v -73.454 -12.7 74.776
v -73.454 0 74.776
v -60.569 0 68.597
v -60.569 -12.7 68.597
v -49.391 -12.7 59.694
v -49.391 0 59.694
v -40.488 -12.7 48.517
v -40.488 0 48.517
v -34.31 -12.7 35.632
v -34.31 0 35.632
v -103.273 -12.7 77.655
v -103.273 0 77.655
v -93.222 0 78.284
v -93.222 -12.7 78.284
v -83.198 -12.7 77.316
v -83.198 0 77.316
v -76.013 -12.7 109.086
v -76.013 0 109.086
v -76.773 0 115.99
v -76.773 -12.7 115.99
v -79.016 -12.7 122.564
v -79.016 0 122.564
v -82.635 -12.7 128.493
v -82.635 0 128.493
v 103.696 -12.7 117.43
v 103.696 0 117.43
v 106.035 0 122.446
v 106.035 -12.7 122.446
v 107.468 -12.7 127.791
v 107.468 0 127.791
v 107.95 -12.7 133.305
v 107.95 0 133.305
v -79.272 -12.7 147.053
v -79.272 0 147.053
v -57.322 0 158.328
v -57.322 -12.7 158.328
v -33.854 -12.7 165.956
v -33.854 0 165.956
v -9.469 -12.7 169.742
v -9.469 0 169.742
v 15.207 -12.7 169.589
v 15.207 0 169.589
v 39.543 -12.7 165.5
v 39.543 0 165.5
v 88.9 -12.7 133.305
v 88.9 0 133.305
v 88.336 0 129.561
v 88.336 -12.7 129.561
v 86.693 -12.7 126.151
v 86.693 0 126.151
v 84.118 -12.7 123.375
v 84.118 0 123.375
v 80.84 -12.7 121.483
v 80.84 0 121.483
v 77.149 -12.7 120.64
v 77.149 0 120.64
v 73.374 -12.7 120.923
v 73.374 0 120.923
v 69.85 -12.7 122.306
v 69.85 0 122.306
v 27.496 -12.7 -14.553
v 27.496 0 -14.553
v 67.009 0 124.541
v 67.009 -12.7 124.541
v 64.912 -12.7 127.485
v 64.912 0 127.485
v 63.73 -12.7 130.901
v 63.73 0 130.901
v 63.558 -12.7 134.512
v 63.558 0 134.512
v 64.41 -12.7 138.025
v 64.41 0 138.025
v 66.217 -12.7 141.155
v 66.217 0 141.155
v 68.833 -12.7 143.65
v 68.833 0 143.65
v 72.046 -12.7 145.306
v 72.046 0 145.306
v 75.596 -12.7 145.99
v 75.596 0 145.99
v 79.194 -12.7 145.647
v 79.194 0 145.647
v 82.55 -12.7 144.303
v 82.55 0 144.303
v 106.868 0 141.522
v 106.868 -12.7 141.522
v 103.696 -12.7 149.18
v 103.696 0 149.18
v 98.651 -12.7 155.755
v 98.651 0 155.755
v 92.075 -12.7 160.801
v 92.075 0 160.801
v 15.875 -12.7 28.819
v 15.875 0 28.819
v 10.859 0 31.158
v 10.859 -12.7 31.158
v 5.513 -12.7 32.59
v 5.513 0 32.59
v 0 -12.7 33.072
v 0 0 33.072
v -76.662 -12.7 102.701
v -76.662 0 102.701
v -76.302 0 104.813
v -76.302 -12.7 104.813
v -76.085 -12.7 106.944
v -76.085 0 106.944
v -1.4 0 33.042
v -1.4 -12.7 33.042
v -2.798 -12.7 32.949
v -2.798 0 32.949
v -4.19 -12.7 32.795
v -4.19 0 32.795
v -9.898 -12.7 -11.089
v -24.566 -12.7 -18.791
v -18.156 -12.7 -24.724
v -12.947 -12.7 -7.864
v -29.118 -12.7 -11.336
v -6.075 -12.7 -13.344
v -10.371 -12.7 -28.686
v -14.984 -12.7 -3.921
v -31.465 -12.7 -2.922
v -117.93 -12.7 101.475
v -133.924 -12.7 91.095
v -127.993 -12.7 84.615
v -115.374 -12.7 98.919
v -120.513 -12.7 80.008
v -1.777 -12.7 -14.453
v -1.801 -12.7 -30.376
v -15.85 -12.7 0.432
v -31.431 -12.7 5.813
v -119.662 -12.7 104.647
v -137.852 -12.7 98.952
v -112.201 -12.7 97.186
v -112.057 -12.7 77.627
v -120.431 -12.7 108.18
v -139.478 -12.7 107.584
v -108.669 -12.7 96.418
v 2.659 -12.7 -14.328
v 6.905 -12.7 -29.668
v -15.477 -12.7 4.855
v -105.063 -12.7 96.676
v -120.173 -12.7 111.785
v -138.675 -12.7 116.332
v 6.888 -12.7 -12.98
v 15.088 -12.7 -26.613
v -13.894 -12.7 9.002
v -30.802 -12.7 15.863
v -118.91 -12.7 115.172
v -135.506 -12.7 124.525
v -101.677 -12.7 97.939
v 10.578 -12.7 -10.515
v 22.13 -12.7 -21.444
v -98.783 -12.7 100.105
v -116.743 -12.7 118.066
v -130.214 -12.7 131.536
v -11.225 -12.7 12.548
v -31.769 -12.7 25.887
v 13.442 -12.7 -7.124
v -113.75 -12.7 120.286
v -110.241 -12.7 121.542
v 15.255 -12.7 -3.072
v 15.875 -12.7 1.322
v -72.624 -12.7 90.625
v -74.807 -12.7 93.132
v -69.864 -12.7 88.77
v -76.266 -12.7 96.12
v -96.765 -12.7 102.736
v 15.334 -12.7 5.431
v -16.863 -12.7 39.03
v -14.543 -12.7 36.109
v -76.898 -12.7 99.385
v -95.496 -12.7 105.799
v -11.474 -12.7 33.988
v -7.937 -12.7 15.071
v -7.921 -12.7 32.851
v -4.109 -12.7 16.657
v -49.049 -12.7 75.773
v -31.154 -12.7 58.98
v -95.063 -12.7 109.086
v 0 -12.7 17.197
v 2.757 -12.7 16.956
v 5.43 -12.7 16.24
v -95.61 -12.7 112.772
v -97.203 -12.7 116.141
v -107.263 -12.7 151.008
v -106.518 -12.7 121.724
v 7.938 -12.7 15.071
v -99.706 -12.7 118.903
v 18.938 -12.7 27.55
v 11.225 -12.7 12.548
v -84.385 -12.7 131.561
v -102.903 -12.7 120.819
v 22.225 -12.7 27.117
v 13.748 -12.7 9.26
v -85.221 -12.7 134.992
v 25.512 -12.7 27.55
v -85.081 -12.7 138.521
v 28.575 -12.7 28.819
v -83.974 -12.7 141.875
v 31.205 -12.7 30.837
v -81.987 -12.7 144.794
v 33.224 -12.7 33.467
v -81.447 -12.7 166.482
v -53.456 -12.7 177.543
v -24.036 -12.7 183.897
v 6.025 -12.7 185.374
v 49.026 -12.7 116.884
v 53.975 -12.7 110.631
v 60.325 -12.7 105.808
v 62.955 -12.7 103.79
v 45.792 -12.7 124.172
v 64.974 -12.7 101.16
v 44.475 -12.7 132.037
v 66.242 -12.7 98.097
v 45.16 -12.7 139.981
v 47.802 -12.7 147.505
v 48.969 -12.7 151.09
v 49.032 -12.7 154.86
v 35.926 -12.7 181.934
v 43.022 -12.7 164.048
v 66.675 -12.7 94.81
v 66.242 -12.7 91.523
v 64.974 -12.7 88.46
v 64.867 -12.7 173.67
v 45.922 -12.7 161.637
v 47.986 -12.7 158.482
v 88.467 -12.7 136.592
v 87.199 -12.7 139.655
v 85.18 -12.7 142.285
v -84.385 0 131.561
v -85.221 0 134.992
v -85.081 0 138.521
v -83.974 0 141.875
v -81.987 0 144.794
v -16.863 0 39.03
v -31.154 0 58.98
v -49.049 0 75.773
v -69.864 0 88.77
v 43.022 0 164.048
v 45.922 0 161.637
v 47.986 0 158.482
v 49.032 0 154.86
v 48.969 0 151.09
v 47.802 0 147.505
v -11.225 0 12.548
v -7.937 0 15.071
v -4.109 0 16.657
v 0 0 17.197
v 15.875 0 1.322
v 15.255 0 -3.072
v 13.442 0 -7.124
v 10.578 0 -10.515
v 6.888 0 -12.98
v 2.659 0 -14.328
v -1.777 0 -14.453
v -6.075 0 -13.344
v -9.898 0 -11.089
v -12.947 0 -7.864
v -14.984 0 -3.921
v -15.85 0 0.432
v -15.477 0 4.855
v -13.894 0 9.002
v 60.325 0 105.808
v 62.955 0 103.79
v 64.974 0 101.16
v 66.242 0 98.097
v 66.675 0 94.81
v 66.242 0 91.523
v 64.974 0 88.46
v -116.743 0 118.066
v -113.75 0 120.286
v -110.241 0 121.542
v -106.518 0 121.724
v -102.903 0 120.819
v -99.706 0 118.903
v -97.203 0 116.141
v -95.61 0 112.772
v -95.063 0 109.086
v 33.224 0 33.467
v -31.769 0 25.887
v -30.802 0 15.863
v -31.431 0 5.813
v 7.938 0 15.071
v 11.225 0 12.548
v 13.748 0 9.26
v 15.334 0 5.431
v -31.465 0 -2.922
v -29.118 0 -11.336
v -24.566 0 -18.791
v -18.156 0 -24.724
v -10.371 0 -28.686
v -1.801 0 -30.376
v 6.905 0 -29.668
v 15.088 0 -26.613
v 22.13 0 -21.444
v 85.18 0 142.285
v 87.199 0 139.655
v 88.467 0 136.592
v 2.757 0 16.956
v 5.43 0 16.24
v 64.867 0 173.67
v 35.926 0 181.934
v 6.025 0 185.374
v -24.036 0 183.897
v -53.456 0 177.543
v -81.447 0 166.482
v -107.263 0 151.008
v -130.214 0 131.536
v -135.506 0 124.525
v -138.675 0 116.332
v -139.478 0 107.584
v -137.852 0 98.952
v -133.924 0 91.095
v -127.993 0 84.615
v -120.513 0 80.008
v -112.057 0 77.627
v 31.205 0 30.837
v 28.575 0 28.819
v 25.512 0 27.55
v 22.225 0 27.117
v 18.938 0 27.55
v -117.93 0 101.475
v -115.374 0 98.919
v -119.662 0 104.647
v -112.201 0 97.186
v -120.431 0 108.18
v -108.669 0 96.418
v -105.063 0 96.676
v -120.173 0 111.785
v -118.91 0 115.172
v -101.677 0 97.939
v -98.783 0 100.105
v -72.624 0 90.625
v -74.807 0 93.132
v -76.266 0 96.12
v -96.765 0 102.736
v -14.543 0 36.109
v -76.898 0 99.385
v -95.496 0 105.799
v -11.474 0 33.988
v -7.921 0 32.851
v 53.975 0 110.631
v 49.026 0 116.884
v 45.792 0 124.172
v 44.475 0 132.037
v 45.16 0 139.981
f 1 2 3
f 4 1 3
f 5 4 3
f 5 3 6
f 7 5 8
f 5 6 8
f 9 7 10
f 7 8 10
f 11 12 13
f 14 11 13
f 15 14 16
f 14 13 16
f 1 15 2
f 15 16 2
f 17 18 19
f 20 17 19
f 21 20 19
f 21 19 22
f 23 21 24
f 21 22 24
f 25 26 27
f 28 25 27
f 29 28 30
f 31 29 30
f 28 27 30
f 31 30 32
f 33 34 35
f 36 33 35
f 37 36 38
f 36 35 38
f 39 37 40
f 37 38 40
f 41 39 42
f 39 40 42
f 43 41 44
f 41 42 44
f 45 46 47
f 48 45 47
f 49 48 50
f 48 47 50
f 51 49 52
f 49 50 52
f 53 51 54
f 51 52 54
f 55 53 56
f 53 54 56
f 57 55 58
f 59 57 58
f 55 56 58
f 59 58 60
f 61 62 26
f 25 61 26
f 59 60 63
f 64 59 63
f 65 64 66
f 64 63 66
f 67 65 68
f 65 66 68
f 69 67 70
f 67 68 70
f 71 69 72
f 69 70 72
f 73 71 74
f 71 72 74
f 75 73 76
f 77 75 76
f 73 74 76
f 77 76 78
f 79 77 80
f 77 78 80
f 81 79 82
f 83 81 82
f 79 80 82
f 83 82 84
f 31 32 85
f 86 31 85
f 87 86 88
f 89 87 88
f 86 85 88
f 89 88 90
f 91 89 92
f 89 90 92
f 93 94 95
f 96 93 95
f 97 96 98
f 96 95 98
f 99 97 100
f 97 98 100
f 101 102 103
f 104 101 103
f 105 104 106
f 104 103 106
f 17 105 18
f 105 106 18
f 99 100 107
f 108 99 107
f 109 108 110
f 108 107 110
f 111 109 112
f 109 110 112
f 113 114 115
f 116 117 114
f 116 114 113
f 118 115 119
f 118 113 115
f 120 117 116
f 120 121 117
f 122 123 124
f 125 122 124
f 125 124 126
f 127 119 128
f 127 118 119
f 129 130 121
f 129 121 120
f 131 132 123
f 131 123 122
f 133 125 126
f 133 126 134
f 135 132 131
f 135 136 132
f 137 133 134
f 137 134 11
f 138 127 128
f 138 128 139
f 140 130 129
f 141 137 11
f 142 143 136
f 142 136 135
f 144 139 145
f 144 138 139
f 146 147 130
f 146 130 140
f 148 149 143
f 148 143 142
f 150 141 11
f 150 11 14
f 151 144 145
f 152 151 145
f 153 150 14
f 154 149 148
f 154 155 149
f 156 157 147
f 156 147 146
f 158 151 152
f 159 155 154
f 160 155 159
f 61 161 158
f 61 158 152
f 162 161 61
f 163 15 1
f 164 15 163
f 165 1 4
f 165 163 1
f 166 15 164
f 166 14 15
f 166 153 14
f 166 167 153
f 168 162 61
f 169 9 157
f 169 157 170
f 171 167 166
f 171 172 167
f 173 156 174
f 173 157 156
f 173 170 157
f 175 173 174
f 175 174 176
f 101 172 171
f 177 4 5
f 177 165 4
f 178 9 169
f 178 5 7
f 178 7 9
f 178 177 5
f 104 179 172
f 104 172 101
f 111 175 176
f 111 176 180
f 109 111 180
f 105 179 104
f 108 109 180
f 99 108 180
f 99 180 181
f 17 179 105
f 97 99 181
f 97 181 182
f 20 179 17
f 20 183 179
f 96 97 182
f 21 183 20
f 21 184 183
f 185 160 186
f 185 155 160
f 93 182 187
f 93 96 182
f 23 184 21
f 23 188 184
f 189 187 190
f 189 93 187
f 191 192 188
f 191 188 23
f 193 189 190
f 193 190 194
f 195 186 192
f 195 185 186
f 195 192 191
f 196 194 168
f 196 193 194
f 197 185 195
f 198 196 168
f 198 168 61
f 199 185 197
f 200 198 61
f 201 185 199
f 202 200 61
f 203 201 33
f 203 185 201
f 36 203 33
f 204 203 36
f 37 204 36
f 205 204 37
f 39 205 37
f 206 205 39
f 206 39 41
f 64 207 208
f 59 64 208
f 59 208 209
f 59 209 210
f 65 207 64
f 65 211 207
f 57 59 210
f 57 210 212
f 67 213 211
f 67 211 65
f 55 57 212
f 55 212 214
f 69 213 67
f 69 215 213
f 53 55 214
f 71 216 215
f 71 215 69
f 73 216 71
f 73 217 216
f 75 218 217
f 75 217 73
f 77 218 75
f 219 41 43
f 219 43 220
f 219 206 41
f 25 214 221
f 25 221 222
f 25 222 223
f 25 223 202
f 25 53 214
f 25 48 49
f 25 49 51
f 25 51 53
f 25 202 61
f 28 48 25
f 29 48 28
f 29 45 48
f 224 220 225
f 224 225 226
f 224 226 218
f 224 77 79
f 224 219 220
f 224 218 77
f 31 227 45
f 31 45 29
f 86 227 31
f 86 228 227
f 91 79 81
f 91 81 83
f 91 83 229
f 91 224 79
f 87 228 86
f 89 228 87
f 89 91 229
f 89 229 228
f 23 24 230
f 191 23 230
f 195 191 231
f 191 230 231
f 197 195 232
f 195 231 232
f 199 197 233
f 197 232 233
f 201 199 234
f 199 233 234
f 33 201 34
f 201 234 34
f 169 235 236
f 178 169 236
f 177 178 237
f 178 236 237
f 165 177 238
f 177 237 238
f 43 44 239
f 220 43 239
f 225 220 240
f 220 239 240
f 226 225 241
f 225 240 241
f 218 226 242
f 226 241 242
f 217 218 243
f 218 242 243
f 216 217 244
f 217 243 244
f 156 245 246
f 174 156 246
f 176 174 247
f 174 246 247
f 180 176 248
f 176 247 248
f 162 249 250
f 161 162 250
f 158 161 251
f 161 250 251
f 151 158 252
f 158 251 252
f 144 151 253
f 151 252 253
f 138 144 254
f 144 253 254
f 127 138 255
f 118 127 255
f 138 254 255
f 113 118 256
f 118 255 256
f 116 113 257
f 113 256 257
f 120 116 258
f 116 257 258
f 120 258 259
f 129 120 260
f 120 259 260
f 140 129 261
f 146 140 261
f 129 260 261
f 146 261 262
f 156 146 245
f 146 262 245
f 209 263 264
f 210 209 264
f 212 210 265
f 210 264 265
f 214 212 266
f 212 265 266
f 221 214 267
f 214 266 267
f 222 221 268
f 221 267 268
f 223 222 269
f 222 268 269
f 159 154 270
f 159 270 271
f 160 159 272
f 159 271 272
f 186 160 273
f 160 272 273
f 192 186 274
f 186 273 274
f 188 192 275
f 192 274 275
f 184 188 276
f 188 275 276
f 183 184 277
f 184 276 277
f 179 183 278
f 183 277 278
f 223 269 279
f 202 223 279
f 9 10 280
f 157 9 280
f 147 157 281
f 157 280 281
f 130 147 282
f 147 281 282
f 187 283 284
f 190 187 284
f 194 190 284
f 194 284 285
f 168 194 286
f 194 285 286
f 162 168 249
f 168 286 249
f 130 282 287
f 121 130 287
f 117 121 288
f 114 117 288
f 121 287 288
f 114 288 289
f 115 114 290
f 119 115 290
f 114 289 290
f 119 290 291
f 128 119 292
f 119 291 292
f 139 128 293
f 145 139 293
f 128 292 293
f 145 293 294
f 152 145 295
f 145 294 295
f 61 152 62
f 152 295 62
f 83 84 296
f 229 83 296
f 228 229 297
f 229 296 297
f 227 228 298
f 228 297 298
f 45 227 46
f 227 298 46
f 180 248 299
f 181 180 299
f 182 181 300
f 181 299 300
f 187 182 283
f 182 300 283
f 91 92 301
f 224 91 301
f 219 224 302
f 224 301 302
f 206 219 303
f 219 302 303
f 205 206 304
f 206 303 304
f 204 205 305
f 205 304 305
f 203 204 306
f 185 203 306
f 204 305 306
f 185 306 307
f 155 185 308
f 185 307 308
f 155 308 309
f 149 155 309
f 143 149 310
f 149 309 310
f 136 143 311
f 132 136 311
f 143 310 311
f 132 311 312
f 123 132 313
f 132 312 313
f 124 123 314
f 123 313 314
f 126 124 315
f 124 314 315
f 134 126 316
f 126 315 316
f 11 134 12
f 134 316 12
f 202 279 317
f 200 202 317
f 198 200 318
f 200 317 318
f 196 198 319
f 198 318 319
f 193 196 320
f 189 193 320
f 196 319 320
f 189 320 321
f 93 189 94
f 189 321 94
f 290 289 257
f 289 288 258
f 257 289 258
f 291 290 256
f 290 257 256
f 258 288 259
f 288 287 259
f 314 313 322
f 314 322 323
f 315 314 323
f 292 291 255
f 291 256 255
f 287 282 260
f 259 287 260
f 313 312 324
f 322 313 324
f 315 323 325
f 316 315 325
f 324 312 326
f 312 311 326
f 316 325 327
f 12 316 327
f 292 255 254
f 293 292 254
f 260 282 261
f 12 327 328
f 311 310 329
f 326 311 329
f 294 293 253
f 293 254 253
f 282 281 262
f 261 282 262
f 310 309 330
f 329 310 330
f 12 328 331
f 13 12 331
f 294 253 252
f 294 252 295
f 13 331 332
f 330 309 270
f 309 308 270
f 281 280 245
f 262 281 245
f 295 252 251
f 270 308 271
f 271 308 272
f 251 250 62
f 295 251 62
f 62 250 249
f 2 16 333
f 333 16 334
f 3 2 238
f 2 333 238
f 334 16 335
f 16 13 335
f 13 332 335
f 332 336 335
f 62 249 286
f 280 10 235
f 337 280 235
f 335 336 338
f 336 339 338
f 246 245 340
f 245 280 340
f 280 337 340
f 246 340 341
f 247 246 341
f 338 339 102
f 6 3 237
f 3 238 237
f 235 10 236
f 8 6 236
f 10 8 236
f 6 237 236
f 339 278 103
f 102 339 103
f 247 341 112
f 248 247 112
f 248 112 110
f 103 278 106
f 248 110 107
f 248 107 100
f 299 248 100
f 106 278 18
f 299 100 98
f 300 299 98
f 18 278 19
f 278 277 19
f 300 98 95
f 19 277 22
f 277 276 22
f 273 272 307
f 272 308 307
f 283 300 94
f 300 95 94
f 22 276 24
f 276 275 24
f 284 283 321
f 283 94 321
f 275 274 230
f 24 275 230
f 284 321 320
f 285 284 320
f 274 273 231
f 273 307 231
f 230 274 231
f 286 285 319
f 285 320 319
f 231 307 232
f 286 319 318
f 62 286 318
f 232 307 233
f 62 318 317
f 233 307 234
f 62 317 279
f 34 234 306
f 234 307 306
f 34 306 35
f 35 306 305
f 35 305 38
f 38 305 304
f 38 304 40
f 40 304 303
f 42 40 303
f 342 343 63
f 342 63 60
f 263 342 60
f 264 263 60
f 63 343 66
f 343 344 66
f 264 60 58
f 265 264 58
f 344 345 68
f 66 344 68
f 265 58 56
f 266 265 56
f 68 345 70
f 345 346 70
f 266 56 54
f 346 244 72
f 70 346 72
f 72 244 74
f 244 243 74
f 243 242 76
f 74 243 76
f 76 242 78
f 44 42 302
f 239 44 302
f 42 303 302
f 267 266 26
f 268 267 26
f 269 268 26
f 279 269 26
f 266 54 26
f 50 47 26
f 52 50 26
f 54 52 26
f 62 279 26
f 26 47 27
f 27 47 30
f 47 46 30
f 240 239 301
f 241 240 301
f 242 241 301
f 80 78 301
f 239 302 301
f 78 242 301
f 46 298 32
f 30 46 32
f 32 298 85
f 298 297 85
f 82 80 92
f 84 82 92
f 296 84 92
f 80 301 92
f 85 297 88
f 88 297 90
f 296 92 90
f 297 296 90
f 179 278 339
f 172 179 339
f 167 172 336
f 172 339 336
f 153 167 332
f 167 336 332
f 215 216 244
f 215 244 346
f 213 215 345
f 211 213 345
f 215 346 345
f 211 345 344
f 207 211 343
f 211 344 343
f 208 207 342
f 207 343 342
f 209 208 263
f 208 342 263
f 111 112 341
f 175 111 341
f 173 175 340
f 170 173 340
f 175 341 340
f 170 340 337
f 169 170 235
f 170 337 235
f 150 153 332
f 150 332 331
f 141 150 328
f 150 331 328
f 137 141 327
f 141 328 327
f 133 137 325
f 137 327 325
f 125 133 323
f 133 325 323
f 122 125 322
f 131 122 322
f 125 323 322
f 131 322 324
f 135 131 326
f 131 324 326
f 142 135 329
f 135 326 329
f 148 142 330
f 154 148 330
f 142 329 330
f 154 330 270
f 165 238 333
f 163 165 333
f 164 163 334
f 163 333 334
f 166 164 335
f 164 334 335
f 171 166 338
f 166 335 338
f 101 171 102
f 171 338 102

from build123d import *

# Parameters (mm, degrees)
F1_DEPTH = 12.7


with BuildPart() as f1:
    # F0 (on Front) → F1 (new body)
    with BuildSketch(Plane.XZ):
        with BuildLine():
            ThreePointArc((-76.6615778684, 102.701242205), (-79.8079393943, 94.0332154271), (-85.3124331502, 86.6349164629))
            Line((-85.3124331502, 86.6349164629), (-73.4535511858, 74.7760344986))
            ThreePointArc((-73.4535511858, 74.7760344986), (-49.3914086659, 59.6941480997), (-34.309522267, 35.6320055797))
            Line((-34.309522267, 35.6320055797), (-22.4506403027, 23.7731236154))
            ThreePointArc((-22.4506403027, 23.7731236154), (-14.0635457715, 29.7878865302), (-4.1903736131, 32.7947452108))
            ThreePointArc((-4.1903736131, 32.7947452108), (-11.4735568319, 33.9884241162), (-16.8631754222, 39.0304116786))
            ThreePointArc((-16.8631754222, 39.0304116786), (-39.690876035, 67.8137699888), (-69.8640218822, 88.7700793147))
            ThreePointArc((-69.8640218822, 88.7700793147), (-75.6347361649, 94.5783008286), (-76.6615778684, 102.701242205))
        make_face()
        with BuildLine():
            Line((-73.4535511858, 74.7760344986), (-85.3124331502, 86.6349164629))
            ThreePointArc((-85.3124331502, 86.6349164629), (-93.5640417957, 80.6874934513), (-103.2729453923, 77.6546603418))
            ThreePointArc((-103.2729453923, 77.6546603418), (-88.1910589934, 77.9990389332), (-73.4535511858, 74.7760344986))
        make_face()
        with BuildLine():
            Line((-22.4506403027, 23.7731236154), (-34.309522267, 35.6320055797))
            ThreePointArc((-34.309522267, 35.6320055797), (-31.0865178324, 20.8944977722), (-31.4308964237, 5.8126113733))
            ThreePointArc((-31.4308964237, 5.8126113733), (-28.3980633142, 15.5215149699), (-22.4506403027, 23.7731236154))
        make_face()
        with BuildLine():
            Line((27.4963065702, -14.5525166873), (103.6963065702, 117.4297548495))
            ThreePointArc((103.6963065702, 117.4297548495), (84.417504682, 102.6366098648), (60.325, 105.8084482793))
            ThreePointArc((60.325, 105.8084482793), (66.2422579939, 98.0969275241), (64.9735226281, 88.4599256513))
            Line((64.9735226281, 88.4599256513), (33.2235226281, 33.467312511))
            ThreePointArc((33.2235226281, 33.467312511), (25.5120018728, 27.5500545171), (15.875, 28.8187898829))
            ThreePointArc((15.875, 28.8187898829), (27.4963065702, 17.1974833127), (31.75, 1.3224833127))
            ThreePointArc((31.75, 1.3224833127), (30.6681449847, -6.8950213693), (27.4963065702, -14.5525166873))
        make_face()
        with BuildLine():
            ThreePointArc((92.075, 160.8010614196), (-24.0363982973, 183.8970545347), (-130.2137137555, 131.5361970682))
            ThreePointArc((-130.2137137555, 131.5361970682), (-105.7367190454, 140.7708275994), (-82.6354727067, 128.4934464175))
            ThreePointArc((-82.6354727067, 128.4934464175), (-85.0809337208, 138.5209907043), (-79.2724649931, 147.0529081346))
            ThreePointArc((-79.2724649931, 147.0529081346), (-21.7373717549, 168.3372367219), (39.542821328, 165.5004193044))
            ThreePointArc((39.542821328, 165.5004193044), (47.9856006443, 158.4820206871), (47.8023187461, 147.5045506016))
            ThreePointArc((47.8023187461, 147.5045506016), (67.0674381234, 163.7129579133), (92.075, 160.8010614196))
        make_face()
        with BuildLine():
            ThreePointArc((-116.7433295739, 118.0658128866), (-102.9029938618, 120.8188268285), (-95.0630734528, 109.0855567656))
            ThreePointArc((-95.0630734528, 109.0855567656), (-96.0298033899, 104.2254771745), (-98.7828173318, 100.1053006445))
            Line((-98.7828173318, 100.1053006445), (-85.3124331502, 86.6349164629))
            ThreePointArc((-85.3124331502, 86.6349164629), (-79.8079393943, 94.0332154271), (-76.6615778684, 102.701242205))
            ThreePointArc((-76.6615778684, 102.701242205), (-76.175615619, 105.8769733404), (-76.0130734528, 109.0855567656))
            ThreePointArc((-76.0130734528, 109.0855567656), (-77.7142479875, 119.338877601), (-82.6354727067, 128.4934464175))
            ThreePointArc((-82.6354727067, 128.4934464175), (-105.7367190454, 140.7708275994), (-130.2137137555, 131.5361970682))
            Line((-130.2137137555, 131.5361970682), (-116.7433295739, 118.0658128866))
        make_face()
        with BuildLine():
            ThreePointArc((107.95, 133.3047548495), (103.6963065702, 149.1797548495), (92.075, 160.8010614196))
            Line((92.075, 160.8010614196), (82.55, 144.3032774775))
            ThreePointArc((82.55, 144.3032774775), (87.1985226281, 139.6547548495), (88.9, 133.3047548495))
            ThreePointArc((88.9, 133.3047548495), (82.55, 122.3062322214), (69.85, 122.3062322214))
            Line((69.85, 122.3062322214), (60.325, 105.8084482793))
            ThreePointArc((60.325, 105.8084482793), (84.417504682, 102.6366098648), (103.6963065702, 117.4297548495))
            ThreePointArc((103.6963065702, 117.4297548495), (106.8681449847, 125.0872501675), (107.95, 133.3047548495))
        make_face()
        with BuildLine():
            Line((82.55, 144.3032774775), (92.075, 160.8010614196))
            ThreePointArc((92.075, 160.8010614196), (67.0674381234, 163.7129579133), (47.8023187461, 147.5045506016))
            ThreePointArc((47.8023187461, 147.5045506016), (45.7917969362, 124.1721929729), (60.325, 105.8084482793))
            Line((60.325, 105.8084482793), (69.85, 122.3062322214))
            ThreePointArc((69.85, 122.3062322214), (65.2014773719, 139.6547548495), (82.55, 144.3032774775))
        make_face()
        with BuildLine():
            ThreePointArc((-98.7828173318, 100.1053006445), (-116.7433295739, 100.1053006445), (-116.7433295739, 118.0658128866))
            Line((-116.7433295739, 118.0658128866), (-130.2137137555, 131.5361970682))
            ThreePointArc((-130.2137137555, 131.5361970682), (-136.1611367671, 94.8865251084), (-103.2729453923, 77.6546603418))
            ThreePointArc((-103.2729453923, 77.6546603418), (-93.5640417957, 80.6874934513), (-85.3124331502, 86.6349164629))
            Line((-85.3124331502, 86.6349164629), (-98.7828173318, 100.1053006445))
        make_face()
        with BuildLine():
            ThreePointArc((-4.1903736131, 32.7947452108), (-14.0635457715, 29.7878865302), (-22.4506403027, 23.7731236154))
            Line((-22.4506403027, 23.7731236154), (-11.2253201513, 12.5478034641))
            ThreePointArc((-11.2253201513, 12.5478034641), (-6.0750994888, 15.9890708914), (0, 17.1974833127))
            Line((0, 17.1974833127), (0, 33.0724833127))
            ThreePointArc((0, 33.0724833127), (-2.0997838859, 33.0029726971), (-4.1903736131, 32.7947452108))
        make_face()
        with BuildLine():
            Line((7.9375, 15.0706365978), (15.875, 28.8187898829))
            ThreePointArc((15.875, 28.8187898829), (8.217504682, 31.9906282974), (0, 33.0724833127))
            Line((0, 33.0724833127), (0, 17.1974833127))
            ThreePointArc((0, 17.1974833127), (4.108752341, 16.6565558051), (7.9375, 15.0706365978))
        make_face()
        with BuildLine():
            Line((-11.2253201513, 12.5478034641), (-22.4506403027, 23.7731236154))
            ThreePointArc((-22.4506403027, 23.7731236154), (-28.3980633142, 15.5215149699), (-31.4308964237, 5.8126113733))
            ThreePointArc((-31.4308964237, 5.8126113733), (-10.3708659021, -28.6859761686), (27.4963065702, -14.5525166873))
            ThreePointArc((27.4963065702, -14.5525166873), (30.6681449847, -6.8950213693), (31.75, 1.3224833127))
            ThreePointArc((31.75, 1.3224833127), (27.4963065702, 17.1974833127), (15.875, 28.8187898829))
            Line((15.875, 28.8187898829), (7.9375, 15.0706365978))
            ThreePointArc((7.9375, 15.0706365978), (13.7481532851, 9.2599833127), (15.875, 1.3224833127))
            ThreePointArc((15.875, 1.3224833127), (-6.0750994888, -13.3441042659), (-11.2253201513, 12.5478034641))
        make_face()
    extrude(amount=F1_DEPTH)


solid = f1.part
